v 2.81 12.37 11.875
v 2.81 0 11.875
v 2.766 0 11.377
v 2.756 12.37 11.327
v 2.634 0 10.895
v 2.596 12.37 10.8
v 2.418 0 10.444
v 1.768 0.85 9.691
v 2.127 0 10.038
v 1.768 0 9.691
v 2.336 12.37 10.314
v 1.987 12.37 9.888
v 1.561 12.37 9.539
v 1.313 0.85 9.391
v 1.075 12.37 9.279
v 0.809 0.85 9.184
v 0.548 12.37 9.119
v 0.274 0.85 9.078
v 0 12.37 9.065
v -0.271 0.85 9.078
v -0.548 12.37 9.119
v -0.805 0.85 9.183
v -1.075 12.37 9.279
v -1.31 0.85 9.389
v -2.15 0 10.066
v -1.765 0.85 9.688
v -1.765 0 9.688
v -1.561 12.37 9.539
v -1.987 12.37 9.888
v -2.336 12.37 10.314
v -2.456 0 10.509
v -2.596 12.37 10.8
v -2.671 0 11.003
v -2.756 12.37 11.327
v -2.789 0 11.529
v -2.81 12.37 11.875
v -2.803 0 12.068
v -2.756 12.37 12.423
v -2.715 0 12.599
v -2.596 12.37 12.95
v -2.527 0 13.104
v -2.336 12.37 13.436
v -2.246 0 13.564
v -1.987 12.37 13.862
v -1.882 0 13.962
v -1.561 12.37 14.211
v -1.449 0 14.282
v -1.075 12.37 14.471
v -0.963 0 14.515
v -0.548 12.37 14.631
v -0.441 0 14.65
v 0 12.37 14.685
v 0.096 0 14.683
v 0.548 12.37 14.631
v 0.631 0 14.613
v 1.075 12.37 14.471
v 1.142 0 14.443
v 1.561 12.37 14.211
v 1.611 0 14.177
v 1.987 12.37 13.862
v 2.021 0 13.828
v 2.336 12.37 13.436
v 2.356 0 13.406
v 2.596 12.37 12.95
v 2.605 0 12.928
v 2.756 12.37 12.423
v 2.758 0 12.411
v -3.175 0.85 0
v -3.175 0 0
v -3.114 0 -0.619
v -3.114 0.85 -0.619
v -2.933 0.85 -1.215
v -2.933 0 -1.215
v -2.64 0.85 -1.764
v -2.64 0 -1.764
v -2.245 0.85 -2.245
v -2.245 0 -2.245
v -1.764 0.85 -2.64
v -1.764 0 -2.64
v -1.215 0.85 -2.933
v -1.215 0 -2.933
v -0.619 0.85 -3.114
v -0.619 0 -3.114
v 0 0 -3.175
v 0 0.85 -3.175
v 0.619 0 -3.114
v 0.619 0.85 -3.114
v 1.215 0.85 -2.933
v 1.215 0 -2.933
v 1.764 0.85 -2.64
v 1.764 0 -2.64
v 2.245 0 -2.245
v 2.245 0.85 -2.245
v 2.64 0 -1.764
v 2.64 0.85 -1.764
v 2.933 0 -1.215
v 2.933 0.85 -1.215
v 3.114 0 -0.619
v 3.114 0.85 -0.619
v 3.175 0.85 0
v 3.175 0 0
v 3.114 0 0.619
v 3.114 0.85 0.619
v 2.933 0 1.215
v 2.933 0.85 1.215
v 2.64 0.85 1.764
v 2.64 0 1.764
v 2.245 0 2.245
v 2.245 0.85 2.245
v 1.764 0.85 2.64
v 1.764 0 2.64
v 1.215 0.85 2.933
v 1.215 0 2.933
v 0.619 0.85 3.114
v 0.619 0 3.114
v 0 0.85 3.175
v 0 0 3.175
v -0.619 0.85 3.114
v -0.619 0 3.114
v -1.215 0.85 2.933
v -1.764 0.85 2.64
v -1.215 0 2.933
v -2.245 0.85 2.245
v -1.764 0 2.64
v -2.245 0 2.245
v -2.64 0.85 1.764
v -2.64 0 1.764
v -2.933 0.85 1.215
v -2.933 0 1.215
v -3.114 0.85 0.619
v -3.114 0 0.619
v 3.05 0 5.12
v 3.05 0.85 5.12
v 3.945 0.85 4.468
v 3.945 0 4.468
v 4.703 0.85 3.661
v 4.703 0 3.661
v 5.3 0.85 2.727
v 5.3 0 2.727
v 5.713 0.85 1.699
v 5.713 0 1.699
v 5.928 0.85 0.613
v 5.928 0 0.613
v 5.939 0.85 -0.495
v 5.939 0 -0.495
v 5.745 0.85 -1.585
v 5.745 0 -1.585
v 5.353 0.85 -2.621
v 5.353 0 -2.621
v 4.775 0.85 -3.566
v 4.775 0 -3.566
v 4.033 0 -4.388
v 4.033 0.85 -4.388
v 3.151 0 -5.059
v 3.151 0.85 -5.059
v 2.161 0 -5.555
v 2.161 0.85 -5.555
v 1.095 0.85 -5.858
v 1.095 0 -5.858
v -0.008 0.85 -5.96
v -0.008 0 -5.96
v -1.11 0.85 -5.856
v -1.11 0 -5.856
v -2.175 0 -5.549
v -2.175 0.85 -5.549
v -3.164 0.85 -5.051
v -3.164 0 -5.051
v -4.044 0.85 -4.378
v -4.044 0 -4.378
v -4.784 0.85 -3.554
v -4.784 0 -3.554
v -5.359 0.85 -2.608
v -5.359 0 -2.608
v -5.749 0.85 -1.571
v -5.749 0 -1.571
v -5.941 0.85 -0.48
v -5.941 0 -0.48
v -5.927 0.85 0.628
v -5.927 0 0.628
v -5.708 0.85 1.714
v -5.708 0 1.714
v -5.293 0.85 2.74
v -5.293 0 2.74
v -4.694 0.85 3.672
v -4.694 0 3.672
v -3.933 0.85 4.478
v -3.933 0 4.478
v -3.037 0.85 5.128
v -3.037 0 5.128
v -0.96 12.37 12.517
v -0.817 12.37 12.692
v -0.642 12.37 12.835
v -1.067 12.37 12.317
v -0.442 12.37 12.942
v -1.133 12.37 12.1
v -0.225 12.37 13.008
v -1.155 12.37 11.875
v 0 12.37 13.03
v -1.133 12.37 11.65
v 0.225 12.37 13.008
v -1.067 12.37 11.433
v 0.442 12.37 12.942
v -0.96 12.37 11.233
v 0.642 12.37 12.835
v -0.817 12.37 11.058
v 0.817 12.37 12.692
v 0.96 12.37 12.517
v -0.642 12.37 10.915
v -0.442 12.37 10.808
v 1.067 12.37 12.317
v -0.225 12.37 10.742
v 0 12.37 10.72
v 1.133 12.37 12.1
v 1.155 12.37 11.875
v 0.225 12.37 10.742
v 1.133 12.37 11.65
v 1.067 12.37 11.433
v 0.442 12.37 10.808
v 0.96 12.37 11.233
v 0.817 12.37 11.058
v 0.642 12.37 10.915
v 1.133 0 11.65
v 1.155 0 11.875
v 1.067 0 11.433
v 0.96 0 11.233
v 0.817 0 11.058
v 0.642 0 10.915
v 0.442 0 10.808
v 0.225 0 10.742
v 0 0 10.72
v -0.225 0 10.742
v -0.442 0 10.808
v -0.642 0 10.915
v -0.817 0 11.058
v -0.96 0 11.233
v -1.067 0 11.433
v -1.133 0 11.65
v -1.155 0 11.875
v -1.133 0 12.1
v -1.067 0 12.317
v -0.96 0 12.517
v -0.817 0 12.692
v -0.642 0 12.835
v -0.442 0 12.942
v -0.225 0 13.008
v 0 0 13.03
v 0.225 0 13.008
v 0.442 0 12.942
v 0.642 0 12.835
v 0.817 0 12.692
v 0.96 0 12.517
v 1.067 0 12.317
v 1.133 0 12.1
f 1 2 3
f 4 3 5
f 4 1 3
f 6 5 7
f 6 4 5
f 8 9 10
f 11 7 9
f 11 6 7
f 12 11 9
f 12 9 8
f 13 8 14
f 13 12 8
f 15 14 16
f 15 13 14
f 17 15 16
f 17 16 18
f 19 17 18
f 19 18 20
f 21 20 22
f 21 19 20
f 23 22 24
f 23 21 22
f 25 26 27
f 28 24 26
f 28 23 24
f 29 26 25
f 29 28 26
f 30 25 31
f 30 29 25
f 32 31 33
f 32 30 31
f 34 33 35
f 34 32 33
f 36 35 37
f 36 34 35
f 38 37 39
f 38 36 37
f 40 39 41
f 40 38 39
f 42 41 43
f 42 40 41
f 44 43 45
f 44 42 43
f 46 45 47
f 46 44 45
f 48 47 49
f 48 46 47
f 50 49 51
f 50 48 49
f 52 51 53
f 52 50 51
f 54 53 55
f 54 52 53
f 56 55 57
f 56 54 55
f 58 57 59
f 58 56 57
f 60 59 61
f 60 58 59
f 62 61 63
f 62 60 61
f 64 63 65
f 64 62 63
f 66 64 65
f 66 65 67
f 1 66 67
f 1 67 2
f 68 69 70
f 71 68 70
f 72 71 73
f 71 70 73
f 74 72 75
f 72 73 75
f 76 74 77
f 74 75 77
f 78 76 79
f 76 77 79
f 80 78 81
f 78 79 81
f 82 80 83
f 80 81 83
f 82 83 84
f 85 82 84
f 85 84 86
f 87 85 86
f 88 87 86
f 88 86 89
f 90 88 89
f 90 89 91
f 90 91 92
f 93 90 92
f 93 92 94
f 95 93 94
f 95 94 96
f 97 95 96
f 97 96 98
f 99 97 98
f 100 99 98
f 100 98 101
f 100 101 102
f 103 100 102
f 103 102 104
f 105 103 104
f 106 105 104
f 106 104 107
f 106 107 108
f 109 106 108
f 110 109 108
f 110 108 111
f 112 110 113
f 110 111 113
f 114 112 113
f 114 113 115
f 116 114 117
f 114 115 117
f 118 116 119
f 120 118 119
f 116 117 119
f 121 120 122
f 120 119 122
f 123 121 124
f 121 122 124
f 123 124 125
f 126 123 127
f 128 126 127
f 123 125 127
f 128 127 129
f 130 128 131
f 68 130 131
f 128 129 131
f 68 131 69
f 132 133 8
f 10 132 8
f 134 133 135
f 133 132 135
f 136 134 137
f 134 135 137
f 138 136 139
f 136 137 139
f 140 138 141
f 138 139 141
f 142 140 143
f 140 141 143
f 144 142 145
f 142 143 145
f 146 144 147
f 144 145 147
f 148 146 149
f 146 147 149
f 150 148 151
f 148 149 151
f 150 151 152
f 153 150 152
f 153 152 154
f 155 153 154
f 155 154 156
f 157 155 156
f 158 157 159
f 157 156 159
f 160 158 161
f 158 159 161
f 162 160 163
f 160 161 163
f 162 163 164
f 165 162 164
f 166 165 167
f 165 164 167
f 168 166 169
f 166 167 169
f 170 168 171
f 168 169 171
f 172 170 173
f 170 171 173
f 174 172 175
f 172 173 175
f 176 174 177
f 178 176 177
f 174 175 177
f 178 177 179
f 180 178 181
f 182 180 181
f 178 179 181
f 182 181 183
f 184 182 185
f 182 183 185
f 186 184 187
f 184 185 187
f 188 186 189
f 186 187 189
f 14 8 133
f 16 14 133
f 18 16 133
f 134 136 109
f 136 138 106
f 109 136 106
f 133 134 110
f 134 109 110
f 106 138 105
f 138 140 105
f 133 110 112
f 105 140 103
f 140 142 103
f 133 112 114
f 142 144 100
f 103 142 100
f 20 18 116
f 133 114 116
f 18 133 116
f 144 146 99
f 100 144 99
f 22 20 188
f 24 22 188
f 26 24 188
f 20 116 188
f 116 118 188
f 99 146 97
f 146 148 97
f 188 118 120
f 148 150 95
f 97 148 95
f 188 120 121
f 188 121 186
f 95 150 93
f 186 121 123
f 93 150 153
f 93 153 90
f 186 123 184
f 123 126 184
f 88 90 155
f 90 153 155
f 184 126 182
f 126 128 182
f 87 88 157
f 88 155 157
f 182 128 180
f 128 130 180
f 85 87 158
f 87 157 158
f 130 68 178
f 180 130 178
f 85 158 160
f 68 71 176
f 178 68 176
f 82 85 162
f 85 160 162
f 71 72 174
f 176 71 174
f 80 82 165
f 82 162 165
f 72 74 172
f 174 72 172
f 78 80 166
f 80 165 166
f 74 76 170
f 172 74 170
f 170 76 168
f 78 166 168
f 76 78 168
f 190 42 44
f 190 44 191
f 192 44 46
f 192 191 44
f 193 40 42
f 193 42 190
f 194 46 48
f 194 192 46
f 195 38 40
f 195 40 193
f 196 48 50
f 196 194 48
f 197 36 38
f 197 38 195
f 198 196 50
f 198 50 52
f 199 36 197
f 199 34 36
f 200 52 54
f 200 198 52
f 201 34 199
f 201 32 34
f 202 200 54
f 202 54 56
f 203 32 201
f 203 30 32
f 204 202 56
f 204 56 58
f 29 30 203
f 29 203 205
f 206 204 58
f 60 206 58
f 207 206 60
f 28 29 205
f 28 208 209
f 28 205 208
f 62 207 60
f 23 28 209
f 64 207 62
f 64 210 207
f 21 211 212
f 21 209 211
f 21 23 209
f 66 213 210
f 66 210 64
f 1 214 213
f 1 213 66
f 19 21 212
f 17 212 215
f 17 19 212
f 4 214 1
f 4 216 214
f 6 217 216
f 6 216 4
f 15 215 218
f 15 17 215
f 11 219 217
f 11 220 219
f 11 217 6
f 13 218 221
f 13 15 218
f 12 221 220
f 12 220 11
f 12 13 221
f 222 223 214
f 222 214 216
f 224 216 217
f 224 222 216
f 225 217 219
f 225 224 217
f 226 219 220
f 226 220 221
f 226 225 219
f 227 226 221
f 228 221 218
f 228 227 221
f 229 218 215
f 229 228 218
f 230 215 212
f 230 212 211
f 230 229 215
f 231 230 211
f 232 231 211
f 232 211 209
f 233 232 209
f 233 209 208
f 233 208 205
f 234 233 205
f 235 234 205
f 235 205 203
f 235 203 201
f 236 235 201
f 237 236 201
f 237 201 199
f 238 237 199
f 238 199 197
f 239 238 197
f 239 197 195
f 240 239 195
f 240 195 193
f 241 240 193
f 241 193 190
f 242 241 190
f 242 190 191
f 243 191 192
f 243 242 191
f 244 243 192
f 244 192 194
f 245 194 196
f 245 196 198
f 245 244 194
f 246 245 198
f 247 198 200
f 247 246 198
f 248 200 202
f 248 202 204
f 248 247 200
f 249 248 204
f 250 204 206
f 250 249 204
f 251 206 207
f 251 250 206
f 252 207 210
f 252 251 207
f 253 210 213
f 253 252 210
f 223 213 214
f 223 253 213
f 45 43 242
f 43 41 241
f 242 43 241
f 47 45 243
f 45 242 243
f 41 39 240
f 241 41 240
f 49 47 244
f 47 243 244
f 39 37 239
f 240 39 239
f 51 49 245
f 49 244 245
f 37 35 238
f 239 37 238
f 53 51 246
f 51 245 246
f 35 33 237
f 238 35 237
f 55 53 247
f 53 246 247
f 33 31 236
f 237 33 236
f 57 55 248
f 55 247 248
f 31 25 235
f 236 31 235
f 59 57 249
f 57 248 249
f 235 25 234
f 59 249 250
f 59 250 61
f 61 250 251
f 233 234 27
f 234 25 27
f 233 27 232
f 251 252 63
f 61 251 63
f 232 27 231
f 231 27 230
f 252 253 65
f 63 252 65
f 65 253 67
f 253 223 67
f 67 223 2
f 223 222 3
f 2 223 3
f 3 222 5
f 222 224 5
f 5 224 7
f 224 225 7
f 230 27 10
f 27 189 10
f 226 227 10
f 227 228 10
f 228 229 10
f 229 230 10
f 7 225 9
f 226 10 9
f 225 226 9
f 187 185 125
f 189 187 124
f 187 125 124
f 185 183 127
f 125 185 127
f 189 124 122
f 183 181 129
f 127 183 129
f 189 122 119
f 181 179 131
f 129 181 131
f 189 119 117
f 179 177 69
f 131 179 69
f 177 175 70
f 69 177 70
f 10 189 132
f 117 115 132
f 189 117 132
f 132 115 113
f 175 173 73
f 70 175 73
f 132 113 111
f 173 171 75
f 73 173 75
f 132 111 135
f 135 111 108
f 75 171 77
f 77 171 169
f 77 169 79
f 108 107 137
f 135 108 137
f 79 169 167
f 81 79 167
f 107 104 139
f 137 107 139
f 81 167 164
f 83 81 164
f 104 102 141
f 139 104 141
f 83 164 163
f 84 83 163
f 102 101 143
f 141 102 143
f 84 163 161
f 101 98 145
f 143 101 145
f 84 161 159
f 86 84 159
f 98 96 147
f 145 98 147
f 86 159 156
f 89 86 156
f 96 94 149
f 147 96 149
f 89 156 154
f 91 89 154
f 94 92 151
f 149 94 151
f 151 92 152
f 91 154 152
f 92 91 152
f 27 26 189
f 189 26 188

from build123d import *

# Parameters (mm, degrees)
SKETCH1_R                       = 5.96
BOSS_EXTRUDE1_DEPTH             = 0.85
F_1_4_0_25_DIAMETER_HOLE1_D     = 6.35
F_1_4_0_25_DIAMETER_HOLE1_DEPTH = 0.85
SKETCH5_R                       = 2.81
SKETCH5_R_2                     = 1.155
BOSS_EXTRUDE2_DEPTH             = 11.52
BOSS_EXTRUDE2_DEPTH_BACK        = 0.85
BOSS_EXTRUDE3_DEPTH             = 0.85
SKETCH9_R                       = 1.155
CUT_EXTRUDE1_DEPTH              = 1.85


with BuildPart() as part:
    # Sketch1 → Boss-Extrude1 (new body)
    with BuildSketch(Plane(origin=(0, 0, 0), x_dir=(1, 0, 0), z_dir=(0, 1, 0))):
        Circle(SKETCH1_R)
    extrude(amount=BOSS_EXTRUDE1_DEPTH)

    # 1/4 (0.25) Diameter Hole1
    with Locations(Plane(origin=(0, 0.85, 0), x_dir=(1, 0, 0), z_dir=(0, 1, 0))):
        with Locations((0, 0)):
            Hole(F_1_4_0_25_DIAMETER_HOLE1_D / 2, depth=F_1_4_0_25_DIAMETER_HOLE1_DEPTH)



with BuildPart() as body_2:
    # Sketch5 → Boss-Extrude2 (new body, two sides)
    with BuildSketch(Plane(origin=(0, 0.85, 0), x_dir=(1, 0, 0), z_dir=(0, 1, 0))) as boss_extrude2_sk:
        with Locations((0, -11.875)):
            Circle(SKETCH5_R)
        with Locations((0, -11.875)):
            Circle(SKETCH5_R_2, mode=Mode.SUBTRACT)
    extrude(amount=BOSS_EXTRUDE2_DEPTH)
    extrude(boss_extrude2_sk.sketch, amount=-BOSS_EXTRUDE2_DEPTH_BACK)


with BuildPart() as part_1:
    add(part.part)

    add(body_2.part)  # Boss-Extrude3 merges body 2
    # Sketch6 → Boss-Extrude3 (add)
    with BuildSketch(Plane(origin=(0, 0.85, 0), x_dir=(1, 0, 0), z_dir=(0, 1, 0))):
        Polygon((-1.155, -11.875), (-3.036993485, -5.128183945), (3.04994253, -5.120493195), (1.155, -11.875), align=None)
    extrude(amount=-BOSS_EXTRUDE3_DEPTH)

    # Sketch9 → Cut-Extrude1 (cut, through all)
    with BuildSketch(Plane(origin=(0, 0.85, 0), x_dir=(1, 0, 0), z_dir=(0, 1, 0))):
        with Locations((0, -11.875)):
            Circle(SKETCH9_R)
    extrude(amount=-CUT_EXTRUDE1_DEPTH, mode=Mode.SUBTRACT)


solid = part_1.part
